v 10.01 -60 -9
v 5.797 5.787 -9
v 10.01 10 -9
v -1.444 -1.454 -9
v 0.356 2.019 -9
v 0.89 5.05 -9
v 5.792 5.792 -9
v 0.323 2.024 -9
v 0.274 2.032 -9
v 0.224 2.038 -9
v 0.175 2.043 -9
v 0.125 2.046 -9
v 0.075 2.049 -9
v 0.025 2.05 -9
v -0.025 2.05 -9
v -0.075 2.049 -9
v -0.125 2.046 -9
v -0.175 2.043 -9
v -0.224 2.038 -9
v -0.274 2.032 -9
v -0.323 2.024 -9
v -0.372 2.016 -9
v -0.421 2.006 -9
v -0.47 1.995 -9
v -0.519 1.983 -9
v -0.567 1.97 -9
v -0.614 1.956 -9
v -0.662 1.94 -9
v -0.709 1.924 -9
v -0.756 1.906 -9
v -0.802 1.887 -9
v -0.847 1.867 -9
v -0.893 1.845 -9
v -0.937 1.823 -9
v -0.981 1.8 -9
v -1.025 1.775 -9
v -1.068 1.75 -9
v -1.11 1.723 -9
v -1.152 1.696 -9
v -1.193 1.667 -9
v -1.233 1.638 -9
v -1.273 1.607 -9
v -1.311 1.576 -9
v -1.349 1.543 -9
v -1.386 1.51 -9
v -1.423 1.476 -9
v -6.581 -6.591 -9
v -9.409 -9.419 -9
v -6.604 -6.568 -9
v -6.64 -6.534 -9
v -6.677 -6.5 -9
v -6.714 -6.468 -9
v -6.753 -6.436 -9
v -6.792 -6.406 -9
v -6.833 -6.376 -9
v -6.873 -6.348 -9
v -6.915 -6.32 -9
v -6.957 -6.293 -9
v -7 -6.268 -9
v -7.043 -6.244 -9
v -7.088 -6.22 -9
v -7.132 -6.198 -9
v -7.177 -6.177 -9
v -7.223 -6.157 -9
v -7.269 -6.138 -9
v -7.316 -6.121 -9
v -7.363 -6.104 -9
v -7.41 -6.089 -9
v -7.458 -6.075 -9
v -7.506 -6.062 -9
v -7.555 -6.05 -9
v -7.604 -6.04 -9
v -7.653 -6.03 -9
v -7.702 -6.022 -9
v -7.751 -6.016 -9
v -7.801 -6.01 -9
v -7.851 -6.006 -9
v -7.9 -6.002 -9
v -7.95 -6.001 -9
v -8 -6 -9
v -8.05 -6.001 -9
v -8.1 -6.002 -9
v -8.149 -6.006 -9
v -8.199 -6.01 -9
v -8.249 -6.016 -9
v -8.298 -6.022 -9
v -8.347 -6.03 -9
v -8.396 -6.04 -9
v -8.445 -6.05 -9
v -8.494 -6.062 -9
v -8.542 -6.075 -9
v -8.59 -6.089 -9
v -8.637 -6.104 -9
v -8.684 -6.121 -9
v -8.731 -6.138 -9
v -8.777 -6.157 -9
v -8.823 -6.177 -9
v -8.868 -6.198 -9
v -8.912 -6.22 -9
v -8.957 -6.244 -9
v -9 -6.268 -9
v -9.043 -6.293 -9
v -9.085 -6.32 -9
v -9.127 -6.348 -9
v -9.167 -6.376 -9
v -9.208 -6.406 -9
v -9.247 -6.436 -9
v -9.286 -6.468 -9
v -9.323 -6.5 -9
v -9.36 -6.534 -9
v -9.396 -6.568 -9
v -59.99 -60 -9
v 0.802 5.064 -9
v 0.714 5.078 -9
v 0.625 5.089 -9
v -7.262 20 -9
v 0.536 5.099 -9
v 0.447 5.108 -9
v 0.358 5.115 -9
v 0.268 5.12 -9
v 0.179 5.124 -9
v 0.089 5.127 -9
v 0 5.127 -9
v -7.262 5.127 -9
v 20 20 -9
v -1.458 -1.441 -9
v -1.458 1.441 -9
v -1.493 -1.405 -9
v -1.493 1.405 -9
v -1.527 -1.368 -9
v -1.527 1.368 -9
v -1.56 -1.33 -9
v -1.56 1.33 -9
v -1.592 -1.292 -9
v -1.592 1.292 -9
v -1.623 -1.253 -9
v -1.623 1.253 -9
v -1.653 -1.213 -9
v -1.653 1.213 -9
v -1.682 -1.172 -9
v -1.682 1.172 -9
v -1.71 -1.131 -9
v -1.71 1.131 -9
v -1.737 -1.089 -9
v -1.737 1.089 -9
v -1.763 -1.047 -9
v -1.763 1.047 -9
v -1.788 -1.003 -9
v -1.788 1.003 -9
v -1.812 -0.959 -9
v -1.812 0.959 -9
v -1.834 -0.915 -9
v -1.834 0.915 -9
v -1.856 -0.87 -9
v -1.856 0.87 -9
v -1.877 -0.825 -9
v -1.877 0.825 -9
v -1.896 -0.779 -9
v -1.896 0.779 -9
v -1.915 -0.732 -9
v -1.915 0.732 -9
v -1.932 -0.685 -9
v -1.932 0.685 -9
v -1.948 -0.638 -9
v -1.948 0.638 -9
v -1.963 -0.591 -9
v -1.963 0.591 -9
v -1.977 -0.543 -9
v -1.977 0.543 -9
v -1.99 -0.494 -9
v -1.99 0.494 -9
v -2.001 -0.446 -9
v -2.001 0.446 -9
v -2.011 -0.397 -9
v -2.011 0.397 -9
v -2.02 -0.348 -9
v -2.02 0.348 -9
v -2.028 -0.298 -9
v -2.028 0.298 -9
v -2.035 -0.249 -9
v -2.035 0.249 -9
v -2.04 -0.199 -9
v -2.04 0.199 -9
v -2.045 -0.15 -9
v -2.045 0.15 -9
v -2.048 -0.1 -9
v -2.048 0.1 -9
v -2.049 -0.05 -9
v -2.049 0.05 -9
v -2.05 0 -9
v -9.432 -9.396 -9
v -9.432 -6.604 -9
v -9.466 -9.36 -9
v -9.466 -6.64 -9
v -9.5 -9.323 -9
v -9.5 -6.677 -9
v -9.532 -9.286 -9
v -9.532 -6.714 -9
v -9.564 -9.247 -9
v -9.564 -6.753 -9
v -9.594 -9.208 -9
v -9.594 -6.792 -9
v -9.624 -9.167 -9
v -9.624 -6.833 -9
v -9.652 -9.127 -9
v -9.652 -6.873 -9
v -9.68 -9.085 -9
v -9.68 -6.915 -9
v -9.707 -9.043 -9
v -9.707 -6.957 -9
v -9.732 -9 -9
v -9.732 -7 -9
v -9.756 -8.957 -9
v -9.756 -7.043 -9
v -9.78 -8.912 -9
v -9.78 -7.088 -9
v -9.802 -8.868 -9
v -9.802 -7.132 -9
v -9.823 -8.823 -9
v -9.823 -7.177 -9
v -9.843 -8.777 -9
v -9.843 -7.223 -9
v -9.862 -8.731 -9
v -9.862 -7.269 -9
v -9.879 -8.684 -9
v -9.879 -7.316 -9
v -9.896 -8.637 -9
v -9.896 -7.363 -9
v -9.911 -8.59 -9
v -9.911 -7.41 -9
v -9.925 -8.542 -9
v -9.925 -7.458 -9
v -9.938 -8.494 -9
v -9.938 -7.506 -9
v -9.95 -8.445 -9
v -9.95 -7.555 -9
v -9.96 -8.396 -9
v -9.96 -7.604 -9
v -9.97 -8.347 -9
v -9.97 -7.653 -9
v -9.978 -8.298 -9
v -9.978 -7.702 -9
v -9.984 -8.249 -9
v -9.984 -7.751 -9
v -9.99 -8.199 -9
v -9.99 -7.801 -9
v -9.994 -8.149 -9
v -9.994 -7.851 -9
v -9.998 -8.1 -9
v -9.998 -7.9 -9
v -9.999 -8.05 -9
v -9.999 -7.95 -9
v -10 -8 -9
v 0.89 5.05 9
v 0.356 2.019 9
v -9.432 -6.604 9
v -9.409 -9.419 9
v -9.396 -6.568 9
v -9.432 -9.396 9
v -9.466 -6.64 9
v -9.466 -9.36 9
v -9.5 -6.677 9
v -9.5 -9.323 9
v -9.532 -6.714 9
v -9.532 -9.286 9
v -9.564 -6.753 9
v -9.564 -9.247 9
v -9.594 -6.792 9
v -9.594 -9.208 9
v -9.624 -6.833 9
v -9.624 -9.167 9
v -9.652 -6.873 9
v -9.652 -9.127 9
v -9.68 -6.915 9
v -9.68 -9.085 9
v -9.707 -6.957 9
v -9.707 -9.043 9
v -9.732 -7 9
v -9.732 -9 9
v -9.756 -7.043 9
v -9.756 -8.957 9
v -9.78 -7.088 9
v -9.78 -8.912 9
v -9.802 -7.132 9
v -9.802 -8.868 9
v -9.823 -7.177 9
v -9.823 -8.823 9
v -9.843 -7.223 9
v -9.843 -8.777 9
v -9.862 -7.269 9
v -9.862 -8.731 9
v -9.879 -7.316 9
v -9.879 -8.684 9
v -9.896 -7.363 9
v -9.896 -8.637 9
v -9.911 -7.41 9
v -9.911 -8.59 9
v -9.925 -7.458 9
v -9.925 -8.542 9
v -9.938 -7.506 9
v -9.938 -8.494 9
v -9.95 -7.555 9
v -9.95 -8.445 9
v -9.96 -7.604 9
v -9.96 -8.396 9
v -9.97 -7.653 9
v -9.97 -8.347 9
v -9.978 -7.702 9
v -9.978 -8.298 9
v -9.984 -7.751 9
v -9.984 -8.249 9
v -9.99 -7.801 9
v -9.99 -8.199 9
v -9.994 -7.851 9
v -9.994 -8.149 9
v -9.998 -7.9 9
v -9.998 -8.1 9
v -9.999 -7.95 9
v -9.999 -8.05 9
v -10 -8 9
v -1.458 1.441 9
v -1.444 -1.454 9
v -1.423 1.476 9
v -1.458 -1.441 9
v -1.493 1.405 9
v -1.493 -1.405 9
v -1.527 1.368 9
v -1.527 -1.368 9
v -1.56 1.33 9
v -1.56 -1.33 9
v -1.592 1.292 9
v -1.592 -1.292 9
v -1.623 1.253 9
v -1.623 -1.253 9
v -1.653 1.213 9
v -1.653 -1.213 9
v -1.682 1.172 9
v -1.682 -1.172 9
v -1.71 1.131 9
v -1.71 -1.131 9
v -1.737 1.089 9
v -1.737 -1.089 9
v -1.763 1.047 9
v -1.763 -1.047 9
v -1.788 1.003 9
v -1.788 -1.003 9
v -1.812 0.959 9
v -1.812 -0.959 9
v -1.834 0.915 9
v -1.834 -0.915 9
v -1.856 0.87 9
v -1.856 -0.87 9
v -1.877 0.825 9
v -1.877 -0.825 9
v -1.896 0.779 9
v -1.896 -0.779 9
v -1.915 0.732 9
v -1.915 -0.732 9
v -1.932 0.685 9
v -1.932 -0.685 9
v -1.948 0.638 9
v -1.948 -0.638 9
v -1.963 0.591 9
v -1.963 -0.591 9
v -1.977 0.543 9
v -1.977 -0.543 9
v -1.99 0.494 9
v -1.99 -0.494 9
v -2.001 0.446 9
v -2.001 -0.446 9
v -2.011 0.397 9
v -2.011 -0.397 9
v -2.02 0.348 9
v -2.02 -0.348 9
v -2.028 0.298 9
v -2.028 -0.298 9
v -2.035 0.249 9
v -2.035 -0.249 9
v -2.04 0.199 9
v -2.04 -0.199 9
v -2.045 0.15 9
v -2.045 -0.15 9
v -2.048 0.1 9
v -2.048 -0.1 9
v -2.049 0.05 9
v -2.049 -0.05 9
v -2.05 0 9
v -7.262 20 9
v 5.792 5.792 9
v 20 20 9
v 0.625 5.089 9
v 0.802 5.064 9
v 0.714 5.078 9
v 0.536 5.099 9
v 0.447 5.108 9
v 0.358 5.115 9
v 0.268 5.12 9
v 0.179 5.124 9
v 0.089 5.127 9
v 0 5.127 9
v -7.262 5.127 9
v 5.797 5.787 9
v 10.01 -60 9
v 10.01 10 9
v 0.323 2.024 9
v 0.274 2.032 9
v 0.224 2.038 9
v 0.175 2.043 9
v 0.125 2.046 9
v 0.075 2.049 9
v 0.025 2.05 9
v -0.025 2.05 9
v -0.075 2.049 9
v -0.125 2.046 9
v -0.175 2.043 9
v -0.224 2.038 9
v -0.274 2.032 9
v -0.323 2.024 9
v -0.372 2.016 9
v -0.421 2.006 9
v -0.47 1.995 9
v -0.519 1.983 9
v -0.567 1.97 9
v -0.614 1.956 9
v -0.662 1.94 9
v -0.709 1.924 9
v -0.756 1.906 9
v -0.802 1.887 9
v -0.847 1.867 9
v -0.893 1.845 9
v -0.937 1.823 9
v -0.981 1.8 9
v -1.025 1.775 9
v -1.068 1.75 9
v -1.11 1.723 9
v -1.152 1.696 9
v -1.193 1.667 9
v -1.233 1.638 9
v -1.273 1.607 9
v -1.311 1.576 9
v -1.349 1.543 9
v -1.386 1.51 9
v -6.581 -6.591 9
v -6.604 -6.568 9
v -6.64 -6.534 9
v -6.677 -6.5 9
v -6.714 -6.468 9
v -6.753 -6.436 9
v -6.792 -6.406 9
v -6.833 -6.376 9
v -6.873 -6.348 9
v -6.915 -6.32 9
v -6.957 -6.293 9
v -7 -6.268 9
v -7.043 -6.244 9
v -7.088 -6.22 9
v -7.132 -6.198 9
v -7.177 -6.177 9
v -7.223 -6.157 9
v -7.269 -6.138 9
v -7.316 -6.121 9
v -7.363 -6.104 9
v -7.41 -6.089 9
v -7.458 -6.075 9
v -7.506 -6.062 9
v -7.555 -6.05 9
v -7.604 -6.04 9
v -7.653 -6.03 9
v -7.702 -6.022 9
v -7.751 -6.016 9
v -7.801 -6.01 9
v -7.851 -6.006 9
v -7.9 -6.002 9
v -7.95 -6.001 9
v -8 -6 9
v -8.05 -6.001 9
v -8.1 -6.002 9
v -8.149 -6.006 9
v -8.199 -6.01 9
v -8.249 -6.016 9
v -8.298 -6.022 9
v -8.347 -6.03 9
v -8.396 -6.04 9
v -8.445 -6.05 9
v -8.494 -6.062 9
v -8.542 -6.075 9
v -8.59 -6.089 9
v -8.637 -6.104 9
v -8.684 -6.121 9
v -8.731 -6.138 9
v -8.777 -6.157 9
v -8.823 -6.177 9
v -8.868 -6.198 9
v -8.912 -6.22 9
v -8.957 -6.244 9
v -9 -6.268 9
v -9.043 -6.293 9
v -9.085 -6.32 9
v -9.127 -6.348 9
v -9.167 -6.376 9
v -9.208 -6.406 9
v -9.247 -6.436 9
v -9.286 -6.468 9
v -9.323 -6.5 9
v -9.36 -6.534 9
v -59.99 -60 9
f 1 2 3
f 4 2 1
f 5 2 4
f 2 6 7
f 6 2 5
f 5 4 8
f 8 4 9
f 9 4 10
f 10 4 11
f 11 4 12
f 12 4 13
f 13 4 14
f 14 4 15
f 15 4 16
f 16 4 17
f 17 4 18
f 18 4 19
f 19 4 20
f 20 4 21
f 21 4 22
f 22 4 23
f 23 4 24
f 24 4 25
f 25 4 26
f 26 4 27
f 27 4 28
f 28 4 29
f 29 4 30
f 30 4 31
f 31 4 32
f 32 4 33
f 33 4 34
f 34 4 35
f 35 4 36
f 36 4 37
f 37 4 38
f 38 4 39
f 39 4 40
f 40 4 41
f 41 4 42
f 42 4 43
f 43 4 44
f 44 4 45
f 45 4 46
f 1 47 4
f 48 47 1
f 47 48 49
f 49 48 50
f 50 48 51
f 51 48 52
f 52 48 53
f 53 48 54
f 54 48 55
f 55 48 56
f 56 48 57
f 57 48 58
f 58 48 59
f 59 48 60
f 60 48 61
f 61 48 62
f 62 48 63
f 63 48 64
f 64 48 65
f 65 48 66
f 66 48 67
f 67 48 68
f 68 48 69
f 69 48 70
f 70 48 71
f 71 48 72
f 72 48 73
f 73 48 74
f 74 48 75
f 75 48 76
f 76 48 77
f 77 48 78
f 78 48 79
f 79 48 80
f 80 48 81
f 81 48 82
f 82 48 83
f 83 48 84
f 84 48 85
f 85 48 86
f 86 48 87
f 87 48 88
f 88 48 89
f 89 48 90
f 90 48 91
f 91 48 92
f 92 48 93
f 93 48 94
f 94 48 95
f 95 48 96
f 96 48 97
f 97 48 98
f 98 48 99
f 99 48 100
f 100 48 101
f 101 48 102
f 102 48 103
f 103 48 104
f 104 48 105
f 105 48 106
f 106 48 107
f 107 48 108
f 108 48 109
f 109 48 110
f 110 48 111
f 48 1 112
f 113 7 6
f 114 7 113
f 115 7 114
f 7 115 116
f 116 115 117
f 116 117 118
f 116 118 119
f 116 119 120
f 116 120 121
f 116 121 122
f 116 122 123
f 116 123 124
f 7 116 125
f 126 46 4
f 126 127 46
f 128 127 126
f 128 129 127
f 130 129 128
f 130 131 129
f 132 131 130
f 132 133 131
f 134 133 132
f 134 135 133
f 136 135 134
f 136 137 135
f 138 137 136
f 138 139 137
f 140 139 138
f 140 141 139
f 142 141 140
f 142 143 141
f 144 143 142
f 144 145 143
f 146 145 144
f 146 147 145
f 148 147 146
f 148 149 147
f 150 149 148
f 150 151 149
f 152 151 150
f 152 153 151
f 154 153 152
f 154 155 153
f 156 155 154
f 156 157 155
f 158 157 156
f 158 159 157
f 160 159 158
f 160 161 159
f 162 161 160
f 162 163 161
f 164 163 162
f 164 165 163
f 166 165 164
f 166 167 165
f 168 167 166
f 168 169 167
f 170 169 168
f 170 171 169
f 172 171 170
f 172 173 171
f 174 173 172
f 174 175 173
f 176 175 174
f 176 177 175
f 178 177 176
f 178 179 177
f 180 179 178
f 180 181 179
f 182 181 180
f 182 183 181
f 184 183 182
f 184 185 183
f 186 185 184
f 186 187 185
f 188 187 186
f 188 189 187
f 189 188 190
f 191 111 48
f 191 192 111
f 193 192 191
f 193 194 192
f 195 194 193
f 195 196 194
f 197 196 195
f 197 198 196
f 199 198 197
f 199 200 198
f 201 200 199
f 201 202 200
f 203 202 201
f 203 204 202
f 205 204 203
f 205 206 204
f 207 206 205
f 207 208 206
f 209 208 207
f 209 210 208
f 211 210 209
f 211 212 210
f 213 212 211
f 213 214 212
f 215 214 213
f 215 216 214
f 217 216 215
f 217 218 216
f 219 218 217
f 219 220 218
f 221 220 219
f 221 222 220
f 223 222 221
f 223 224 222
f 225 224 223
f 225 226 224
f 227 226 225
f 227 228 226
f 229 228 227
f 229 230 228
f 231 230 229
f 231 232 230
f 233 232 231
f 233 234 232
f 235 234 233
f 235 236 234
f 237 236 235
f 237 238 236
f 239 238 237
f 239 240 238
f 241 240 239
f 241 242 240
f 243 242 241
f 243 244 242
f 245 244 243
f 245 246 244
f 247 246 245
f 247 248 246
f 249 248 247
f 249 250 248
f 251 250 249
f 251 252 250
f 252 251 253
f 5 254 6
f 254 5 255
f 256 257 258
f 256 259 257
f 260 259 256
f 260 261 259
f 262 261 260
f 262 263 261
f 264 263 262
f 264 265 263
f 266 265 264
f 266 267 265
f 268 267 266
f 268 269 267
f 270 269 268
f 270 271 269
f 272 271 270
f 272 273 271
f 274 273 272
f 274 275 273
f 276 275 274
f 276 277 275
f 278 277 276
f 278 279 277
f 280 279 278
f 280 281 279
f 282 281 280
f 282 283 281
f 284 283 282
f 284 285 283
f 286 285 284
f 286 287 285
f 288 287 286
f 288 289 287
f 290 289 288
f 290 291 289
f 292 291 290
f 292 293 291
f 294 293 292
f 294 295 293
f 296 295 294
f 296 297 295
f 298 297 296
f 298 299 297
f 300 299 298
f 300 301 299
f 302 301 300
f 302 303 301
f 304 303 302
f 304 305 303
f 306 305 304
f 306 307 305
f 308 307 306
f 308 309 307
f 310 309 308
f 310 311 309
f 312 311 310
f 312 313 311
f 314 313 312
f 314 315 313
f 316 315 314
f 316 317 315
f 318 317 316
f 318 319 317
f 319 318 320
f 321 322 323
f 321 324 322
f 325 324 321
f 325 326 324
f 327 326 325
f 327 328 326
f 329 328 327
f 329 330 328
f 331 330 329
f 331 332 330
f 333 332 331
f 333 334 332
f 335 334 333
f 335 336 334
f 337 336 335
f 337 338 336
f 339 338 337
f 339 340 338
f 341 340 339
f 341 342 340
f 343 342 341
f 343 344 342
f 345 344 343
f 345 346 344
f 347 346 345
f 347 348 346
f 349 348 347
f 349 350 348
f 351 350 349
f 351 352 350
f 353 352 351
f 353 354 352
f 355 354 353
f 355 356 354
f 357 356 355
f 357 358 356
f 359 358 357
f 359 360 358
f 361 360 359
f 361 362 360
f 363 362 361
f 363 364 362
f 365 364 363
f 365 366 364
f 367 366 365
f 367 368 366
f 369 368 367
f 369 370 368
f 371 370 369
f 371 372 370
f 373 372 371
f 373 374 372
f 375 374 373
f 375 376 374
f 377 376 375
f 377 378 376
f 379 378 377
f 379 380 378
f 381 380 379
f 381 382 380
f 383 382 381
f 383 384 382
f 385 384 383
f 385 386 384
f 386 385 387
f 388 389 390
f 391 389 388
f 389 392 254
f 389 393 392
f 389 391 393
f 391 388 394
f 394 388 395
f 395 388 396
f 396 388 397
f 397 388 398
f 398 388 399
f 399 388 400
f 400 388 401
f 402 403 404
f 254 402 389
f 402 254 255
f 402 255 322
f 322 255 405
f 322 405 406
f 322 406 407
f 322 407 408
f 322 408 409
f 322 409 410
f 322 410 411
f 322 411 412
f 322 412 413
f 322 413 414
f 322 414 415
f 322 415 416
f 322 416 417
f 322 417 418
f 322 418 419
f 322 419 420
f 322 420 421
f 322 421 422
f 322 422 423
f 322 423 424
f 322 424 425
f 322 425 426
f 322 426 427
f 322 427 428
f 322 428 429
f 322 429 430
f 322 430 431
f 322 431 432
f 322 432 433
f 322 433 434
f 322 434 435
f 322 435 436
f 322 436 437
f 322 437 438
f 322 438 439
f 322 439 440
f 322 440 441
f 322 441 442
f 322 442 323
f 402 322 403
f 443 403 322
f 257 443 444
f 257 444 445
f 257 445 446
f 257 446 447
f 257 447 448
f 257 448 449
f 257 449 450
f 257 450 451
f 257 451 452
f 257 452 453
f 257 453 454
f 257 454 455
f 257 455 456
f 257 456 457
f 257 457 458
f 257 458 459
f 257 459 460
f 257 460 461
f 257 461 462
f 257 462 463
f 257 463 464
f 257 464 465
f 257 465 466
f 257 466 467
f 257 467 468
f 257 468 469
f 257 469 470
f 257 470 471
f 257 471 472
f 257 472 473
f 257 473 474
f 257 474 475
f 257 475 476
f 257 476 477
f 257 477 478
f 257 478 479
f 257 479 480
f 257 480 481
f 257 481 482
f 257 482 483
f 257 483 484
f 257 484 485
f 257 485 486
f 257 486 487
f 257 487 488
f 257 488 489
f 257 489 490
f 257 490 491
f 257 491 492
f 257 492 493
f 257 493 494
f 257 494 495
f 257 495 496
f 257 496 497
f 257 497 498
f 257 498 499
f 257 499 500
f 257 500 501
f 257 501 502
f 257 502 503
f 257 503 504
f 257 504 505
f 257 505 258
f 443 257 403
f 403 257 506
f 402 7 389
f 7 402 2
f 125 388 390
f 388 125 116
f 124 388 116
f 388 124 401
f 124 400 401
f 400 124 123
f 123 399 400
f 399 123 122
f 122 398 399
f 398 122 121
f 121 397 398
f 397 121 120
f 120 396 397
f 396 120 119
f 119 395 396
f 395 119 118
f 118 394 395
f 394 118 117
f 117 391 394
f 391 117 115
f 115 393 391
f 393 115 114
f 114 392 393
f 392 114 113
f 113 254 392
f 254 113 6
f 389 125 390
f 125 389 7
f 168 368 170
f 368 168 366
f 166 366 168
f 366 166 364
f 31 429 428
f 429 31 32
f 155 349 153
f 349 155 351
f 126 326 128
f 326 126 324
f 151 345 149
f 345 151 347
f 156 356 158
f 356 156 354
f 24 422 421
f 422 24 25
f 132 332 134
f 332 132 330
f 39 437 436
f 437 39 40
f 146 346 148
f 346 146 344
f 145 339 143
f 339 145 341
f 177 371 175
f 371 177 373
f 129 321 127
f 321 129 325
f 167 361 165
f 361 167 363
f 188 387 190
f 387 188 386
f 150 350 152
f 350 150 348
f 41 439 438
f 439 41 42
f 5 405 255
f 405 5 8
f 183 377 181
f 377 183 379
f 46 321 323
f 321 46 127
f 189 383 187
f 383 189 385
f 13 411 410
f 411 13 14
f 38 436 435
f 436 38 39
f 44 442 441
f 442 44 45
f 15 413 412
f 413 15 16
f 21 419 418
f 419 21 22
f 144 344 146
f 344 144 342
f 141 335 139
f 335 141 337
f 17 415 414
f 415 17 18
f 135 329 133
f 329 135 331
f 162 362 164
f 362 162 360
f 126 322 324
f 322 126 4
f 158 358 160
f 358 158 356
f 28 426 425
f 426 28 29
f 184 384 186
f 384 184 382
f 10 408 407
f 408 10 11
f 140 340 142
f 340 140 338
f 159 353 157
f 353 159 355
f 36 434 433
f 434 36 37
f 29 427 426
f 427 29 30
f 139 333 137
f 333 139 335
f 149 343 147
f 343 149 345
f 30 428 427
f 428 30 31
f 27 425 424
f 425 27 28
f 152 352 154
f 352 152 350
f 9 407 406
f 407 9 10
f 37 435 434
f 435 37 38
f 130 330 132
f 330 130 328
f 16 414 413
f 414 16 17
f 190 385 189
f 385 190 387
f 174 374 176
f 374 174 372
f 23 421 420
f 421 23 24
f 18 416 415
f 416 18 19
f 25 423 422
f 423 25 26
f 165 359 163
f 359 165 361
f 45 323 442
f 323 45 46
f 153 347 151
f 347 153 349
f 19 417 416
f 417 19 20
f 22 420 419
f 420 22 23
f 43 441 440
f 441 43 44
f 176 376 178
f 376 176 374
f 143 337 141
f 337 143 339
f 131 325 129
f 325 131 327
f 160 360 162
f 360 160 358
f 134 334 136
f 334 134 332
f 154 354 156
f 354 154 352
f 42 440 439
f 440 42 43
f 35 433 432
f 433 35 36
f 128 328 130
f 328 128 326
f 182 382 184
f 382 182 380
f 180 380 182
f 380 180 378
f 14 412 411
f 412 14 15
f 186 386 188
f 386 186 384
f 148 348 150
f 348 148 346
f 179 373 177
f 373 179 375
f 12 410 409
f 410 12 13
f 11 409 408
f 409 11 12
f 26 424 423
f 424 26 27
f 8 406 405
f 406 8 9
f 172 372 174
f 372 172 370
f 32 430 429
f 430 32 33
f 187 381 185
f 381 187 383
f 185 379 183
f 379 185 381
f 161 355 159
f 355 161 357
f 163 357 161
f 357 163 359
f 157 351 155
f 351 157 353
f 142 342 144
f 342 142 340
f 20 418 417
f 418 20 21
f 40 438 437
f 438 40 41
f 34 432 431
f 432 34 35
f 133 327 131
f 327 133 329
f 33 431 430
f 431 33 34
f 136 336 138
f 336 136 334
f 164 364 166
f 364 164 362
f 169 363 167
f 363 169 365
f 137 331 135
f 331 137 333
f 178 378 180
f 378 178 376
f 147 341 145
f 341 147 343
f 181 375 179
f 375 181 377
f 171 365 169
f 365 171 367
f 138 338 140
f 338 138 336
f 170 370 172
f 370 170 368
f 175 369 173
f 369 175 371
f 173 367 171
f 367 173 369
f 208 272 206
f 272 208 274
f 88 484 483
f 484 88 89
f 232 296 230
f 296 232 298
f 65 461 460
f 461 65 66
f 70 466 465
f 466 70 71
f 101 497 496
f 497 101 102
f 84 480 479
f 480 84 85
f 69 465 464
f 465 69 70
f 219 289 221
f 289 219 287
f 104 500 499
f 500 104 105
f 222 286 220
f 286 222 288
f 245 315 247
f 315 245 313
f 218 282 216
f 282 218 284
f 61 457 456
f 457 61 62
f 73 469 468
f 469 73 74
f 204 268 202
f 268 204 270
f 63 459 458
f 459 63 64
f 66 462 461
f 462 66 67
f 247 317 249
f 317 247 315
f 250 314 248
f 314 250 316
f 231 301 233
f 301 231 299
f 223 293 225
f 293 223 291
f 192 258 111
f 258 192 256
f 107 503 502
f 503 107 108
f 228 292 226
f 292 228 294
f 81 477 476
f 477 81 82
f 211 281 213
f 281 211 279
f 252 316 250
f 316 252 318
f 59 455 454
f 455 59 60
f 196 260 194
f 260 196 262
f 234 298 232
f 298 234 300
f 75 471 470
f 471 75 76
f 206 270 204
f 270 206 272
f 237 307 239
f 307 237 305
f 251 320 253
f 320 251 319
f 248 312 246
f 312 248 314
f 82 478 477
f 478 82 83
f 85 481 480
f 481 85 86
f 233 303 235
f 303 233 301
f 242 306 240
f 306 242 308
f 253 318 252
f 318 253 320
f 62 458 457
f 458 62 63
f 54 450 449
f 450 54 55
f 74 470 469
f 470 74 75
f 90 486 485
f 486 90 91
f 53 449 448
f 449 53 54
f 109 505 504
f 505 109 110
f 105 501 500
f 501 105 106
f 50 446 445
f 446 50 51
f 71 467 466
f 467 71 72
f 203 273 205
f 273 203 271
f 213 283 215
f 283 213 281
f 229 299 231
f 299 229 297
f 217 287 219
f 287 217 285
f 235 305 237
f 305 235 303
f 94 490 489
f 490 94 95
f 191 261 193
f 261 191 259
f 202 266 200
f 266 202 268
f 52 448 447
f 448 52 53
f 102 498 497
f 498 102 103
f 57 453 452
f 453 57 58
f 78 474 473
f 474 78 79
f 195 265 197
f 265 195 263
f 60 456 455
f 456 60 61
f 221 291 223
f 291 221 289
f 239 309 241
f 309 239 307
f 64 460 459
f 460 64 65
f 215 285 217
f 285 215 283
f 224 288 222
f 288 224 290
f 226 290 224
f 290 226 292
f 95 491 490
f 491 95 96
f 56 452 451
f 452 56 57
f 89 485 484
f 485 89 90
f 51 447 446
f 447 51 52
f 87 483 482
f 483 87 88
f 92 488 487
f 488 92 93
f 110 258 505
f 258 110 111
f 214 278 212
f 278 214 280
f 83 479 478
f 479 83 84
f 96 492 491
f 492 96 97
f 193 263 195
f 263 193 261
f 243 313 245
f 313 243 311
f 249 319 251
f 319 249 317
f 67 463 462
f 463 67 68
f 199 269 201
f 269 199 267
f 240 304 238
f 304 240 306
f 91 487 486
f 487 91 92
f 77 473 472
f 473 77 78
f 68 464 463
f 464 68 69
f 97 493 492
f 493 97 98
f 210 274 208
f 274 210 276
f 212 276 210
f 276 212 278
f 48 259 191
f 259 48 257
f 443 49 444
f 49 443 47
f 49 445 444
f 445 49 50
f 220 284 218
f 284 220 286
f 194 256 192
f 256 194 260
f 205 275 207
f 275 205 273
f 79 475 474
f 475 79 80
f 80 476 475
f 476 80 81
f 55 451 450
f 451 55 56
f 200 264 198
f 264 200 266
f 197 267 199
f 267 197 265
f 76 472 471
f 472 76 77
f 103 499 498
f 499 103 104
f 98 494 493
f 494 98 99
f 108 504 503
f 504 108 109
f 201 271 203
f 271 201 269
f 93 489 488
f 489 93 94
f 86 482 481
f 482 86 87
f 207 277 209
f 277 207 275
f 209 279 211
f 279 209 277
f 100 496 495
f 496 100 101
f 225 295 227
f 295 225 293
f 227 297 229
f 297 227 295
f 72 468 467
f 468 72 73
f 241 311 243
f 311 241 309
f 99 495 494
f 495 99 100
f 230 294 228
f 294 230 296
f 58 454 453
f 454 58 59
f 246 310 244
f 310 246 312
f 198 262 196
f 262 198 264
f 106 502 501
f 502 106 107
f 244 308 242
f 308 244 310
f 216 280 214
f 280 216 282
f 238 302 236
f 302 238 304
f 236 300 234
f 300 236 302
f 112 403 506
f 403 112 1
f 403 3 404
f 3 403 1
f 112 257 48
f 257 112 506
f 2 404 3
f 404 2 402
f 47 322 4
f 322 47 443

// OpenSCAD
// file: ../scad/shape_modifier_utils.scad
// Overlap used to break coincident faces in booleans. Subtracting a cut that lands
// exactly on a surface leaves zero-thickness geometry, which renders unpredictably and
// slices worse; every cut is extended by this much so the faces genuinely cross.
//
// A function rather than a variable: `use <...>` exports functions but not top-level
// variable assignments, and the sweep reaches these files through `use`. Twelve modules
// across four files each declared their own `eps = 0.01` before this existed.
function geometry_eps() = 0.01;

// Length for a *centred* cutting solid that must pass entirely through material of
// depth `extent`. A centred cut reaches half this each way, so the factor leaves 50%
// clearance beyond `extent` on both sides -- a cut that lands flush on a face produces
// a zero-thickness shell rather than a clean hole.
//
// Measured against the swept parameter space: the deepest thing any of these cuts must
// clear is one bulkhead_section, one bulkhead_thickness tall, so the margin is 0.5 *
// bulkhead_thickness everywhere and scales with the part. Interconnect bulkheads stack
// two sections, but each section's cuts are applied before stacking, so the stack is
// not what a cut has to span.
function through_cut(extent) = 3 * extent;

// Distance at which to place a mask vertex so it lies outside anything within `extent`
// of the origin. Used by the half-plane polygons that trim an octant down to its
// wedge, where the vertex position only has to be "far enough" to be off the part.
//
// Worst case across 412 valid combinations is 3.25 mm of clearance, at U=0.5 with 1 mm
// panel: the shape reaches panel_offset + panel_overlap = 6.75 mm while the mask sits
// at 10 mm. Positive everywhere, and the gap widens with U.
function mask_reach(extent) = 2 * extent;


module octant_to_full() {
    mirror_x() {
        mirror_y() {
            mirror_xy() {
                children();
            }
        }
    }
}

module mirror_x() {
    union() {
        children();
        mirror([-1,0,0]) {
            children();
        }
    }
    
}

module mirror_y() {
    union() {
        children();
        mirror([0,-1,0]) {
            children();
        }
    }
    
}

module mirror_xy() {
    union() {
        children();
        mirror([1,-1,0]) {
            children();
        }
    }
}

module corner_translate(unit_width, corner_radius) {
    translate([unit_width/2-corner_radius,unit_width/2-corner_radius,0]) {
        children();
    }
}

// Move an octant out to its corner, then mirror it into all four -- the standard way
// a bulkhead profile is built from the one octant that is actually drawn.
//
// Every `*_shape` wrapper in fuselage_bulkhead_geometry.scad had this same pair open-
// coded around its own `*_octant` call. The wrappers stay: they name the full shape as
// distinct from the octant, and they are what seven call sites across two files use.
// It is the repeated body that is worth removing, not the interface.
module octant_tiled(unit_width, corner_radius) {
    octant_to_full() {
        corner_translate(unit_width, corner_radius) {
            children();
        }
    }
}


// mask lower diagonal quadrant
module octant_mask(unit_width, corner_radius) {
    eps = geometry_eps();
    polygon([[corner_radius+eps,corner_radius],
            [corner_radius+eps,-unit_width/2-corner_radius],
            [-unit_width/2-corner_radius+eps,-unit_width/2-corner_radius]]);
}

// fillet inward
module fillet_inner(radius) {
    intersection() {
        offset(r = -radius) {
            // fillet outward as well to ensure we round off any inward fillet artifacts (from input boundaries that are closer than 2*radius)
            offset(r = 2*radius) {
                offset(r = -radius) {
                    children();
                }
            }
        }
        // guarantee that the resultant shape has not gone outside the boundaries of the input shape
        children();
    }
}

// fillet outward
module fillet_outer(radius) {
    union() {
        offset(r = -radius) {
            offset(r = radius) {
                children();
            }
        }
        // guarantee that the resultant shape has not erroded into the boundaries of teh input shape
        children();
    }
}
// main file
// The four geometric cut tools of bulkhead_section, as their union -- the longeron opening
// wedge, the outer-face cleanup, the longeron and bolt holes, and the octant mask. The fifth
// cut, the greeble-forming corner_end, is a real module and is checked by bulkhead_tree.py.
//
// Like ref_flange_boss.scad this is a TRANSCRIPTION: bulkhead_section builds these inline,
// so there is nothing to `use`, and on its own this file only proves the port matches the
// transcription. The binding check is the assembled bulkhead_section, which goes through the
// real module.
//
// Derived parameters for U=1.0 end_bolt 3/16in, is_cowling = false, is_interconnect = false.
$fa=1;
$fs=0.05;

use <../scad/shape_modifier_utils.scad>

unit_width = 100.0;
bulkhead_thickness = 6;
corner_radius = 10.0;
panel_thickness = 4.7625;
panel_offset = 2.5;
panel_overlap = 4.7625;
panel_tolerance = 0.1;
longeron_radius = 2.0;
longeron_tolerance = 0.05;
bolt_hole_radius = 2.0;
bolt_offset = 8.0;
greeble_opening_angle = 35;

eps = geometry_eps();

union() {

    // longeron opening cutout
    linear_extrude(height=through_cut(bulkhead_thickness), center=true, convexity=3,twist=0,slices=1,scale=1){
        polygon([[0,0],[sin(45-greeble_opening_angle)*corner_radius,cos(45-greeble_opening_angle)*corner_radius],[cos(45-greeble_opening_angle)*corner_radius,sin(45-greeble_opening_angle)*corner_radius]]);
    }

    // clean up the outer faces of the corner cutout
    linear_extrude(height=through_cut(bulkhead_thickness), center=true, convexity=5,twist=0,slices=1,scale=1){
        difference() {
            polygon([
                [0,0],
                [mask_reach(corner_radius),mask_reach(corner_radius)],
                [-(panel_offset+panel_overlap),mask_reach(corner_radius)],
                [-(panel_offset+panel_overlap),corner_radius-(panel_thickness+panel_tolerance+eps)],
                [0,corner_radius-(panel_thickness+panel_tolerance+eps)]
                ]);
            circle(r=corner_radius-(panel_thickness+panel_tolerance+eps));
        }
    }

    // longeron hole
    cylinder(h=through_cut(bulkhead_thickness), r=longeron_radius+longeron_tolerance, center=true);

    // bolt hole
    translate([-bolt_offset,-bolt_offset,0]){
        cylinder(h=through_cut(bulkhead_thickness), r=bolt_hole_radius, center=true);
    }

    linear_extrude(height=through_cut(bulkhead_thickness), center=true, convexity=5,twist=0,slices=1,scale=1) {
        octant_mask(unit_width, corner_radius);
    }
}
